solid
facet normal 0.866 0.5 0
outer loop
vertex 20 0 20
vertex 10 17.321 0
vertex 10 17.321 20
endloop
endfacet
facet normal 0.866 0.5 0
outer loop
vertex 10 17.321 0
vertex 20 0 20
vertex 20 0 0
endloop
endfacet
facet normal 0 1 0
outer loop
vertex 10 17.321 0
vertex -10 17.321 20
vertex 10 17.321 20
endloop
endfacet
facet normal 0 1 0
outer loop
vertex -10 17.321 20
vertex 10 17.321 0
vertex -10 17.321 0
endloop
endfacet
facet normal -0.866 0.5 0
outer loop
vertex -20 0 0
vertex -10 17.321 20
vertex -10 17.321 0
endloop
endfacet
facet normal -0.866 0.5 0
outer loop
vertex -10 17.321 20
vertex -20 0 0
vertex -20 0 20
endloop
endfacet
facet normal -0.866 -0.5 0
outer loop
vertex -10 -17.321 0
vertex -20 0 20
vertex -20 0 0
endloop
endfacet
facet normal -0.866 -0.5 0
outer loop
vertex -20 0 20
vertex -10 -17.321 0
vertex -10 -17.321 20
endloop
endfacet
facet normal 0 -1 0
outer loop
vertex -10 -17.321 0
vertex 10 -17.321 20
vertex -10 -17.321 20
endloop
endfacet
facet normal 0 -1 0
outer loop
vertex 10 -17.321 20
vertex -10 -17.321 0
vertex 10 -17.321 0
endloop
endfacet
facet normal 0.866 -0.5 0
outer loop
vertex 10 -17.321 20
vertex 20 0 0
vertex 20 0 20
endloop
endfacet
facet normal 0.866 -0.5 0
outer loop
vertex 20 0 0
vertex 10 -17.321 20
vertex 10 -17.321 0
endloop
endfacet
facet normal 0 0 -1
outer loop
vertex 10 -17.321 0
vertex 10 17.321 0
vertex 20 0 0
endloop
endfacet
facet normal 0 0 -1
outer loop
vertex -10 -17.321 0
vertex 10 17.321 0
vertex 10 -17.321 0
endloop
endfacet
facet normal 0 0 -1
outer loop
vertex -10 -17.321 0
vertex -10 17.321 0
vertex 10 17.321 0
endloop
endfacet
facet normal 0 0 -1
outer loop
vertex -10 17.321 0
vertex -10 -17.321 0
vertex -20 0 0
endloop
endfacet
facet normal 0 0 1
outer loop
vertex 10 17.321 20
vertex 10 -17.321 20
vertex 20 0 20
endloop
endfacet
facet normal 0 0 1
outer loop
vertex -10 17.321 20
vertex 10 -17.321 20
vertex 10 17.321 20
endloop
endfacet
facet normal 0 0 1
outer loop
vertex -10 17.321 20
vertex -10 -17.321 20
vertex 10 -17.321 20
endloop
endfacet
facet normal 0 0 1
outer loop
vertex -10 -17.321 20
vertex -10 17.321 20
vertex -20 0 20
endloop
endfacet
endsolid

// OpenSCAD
module HexagonLink() {
  cylinder(20, d=40, $fn = 6);
};

HexagonLink();
